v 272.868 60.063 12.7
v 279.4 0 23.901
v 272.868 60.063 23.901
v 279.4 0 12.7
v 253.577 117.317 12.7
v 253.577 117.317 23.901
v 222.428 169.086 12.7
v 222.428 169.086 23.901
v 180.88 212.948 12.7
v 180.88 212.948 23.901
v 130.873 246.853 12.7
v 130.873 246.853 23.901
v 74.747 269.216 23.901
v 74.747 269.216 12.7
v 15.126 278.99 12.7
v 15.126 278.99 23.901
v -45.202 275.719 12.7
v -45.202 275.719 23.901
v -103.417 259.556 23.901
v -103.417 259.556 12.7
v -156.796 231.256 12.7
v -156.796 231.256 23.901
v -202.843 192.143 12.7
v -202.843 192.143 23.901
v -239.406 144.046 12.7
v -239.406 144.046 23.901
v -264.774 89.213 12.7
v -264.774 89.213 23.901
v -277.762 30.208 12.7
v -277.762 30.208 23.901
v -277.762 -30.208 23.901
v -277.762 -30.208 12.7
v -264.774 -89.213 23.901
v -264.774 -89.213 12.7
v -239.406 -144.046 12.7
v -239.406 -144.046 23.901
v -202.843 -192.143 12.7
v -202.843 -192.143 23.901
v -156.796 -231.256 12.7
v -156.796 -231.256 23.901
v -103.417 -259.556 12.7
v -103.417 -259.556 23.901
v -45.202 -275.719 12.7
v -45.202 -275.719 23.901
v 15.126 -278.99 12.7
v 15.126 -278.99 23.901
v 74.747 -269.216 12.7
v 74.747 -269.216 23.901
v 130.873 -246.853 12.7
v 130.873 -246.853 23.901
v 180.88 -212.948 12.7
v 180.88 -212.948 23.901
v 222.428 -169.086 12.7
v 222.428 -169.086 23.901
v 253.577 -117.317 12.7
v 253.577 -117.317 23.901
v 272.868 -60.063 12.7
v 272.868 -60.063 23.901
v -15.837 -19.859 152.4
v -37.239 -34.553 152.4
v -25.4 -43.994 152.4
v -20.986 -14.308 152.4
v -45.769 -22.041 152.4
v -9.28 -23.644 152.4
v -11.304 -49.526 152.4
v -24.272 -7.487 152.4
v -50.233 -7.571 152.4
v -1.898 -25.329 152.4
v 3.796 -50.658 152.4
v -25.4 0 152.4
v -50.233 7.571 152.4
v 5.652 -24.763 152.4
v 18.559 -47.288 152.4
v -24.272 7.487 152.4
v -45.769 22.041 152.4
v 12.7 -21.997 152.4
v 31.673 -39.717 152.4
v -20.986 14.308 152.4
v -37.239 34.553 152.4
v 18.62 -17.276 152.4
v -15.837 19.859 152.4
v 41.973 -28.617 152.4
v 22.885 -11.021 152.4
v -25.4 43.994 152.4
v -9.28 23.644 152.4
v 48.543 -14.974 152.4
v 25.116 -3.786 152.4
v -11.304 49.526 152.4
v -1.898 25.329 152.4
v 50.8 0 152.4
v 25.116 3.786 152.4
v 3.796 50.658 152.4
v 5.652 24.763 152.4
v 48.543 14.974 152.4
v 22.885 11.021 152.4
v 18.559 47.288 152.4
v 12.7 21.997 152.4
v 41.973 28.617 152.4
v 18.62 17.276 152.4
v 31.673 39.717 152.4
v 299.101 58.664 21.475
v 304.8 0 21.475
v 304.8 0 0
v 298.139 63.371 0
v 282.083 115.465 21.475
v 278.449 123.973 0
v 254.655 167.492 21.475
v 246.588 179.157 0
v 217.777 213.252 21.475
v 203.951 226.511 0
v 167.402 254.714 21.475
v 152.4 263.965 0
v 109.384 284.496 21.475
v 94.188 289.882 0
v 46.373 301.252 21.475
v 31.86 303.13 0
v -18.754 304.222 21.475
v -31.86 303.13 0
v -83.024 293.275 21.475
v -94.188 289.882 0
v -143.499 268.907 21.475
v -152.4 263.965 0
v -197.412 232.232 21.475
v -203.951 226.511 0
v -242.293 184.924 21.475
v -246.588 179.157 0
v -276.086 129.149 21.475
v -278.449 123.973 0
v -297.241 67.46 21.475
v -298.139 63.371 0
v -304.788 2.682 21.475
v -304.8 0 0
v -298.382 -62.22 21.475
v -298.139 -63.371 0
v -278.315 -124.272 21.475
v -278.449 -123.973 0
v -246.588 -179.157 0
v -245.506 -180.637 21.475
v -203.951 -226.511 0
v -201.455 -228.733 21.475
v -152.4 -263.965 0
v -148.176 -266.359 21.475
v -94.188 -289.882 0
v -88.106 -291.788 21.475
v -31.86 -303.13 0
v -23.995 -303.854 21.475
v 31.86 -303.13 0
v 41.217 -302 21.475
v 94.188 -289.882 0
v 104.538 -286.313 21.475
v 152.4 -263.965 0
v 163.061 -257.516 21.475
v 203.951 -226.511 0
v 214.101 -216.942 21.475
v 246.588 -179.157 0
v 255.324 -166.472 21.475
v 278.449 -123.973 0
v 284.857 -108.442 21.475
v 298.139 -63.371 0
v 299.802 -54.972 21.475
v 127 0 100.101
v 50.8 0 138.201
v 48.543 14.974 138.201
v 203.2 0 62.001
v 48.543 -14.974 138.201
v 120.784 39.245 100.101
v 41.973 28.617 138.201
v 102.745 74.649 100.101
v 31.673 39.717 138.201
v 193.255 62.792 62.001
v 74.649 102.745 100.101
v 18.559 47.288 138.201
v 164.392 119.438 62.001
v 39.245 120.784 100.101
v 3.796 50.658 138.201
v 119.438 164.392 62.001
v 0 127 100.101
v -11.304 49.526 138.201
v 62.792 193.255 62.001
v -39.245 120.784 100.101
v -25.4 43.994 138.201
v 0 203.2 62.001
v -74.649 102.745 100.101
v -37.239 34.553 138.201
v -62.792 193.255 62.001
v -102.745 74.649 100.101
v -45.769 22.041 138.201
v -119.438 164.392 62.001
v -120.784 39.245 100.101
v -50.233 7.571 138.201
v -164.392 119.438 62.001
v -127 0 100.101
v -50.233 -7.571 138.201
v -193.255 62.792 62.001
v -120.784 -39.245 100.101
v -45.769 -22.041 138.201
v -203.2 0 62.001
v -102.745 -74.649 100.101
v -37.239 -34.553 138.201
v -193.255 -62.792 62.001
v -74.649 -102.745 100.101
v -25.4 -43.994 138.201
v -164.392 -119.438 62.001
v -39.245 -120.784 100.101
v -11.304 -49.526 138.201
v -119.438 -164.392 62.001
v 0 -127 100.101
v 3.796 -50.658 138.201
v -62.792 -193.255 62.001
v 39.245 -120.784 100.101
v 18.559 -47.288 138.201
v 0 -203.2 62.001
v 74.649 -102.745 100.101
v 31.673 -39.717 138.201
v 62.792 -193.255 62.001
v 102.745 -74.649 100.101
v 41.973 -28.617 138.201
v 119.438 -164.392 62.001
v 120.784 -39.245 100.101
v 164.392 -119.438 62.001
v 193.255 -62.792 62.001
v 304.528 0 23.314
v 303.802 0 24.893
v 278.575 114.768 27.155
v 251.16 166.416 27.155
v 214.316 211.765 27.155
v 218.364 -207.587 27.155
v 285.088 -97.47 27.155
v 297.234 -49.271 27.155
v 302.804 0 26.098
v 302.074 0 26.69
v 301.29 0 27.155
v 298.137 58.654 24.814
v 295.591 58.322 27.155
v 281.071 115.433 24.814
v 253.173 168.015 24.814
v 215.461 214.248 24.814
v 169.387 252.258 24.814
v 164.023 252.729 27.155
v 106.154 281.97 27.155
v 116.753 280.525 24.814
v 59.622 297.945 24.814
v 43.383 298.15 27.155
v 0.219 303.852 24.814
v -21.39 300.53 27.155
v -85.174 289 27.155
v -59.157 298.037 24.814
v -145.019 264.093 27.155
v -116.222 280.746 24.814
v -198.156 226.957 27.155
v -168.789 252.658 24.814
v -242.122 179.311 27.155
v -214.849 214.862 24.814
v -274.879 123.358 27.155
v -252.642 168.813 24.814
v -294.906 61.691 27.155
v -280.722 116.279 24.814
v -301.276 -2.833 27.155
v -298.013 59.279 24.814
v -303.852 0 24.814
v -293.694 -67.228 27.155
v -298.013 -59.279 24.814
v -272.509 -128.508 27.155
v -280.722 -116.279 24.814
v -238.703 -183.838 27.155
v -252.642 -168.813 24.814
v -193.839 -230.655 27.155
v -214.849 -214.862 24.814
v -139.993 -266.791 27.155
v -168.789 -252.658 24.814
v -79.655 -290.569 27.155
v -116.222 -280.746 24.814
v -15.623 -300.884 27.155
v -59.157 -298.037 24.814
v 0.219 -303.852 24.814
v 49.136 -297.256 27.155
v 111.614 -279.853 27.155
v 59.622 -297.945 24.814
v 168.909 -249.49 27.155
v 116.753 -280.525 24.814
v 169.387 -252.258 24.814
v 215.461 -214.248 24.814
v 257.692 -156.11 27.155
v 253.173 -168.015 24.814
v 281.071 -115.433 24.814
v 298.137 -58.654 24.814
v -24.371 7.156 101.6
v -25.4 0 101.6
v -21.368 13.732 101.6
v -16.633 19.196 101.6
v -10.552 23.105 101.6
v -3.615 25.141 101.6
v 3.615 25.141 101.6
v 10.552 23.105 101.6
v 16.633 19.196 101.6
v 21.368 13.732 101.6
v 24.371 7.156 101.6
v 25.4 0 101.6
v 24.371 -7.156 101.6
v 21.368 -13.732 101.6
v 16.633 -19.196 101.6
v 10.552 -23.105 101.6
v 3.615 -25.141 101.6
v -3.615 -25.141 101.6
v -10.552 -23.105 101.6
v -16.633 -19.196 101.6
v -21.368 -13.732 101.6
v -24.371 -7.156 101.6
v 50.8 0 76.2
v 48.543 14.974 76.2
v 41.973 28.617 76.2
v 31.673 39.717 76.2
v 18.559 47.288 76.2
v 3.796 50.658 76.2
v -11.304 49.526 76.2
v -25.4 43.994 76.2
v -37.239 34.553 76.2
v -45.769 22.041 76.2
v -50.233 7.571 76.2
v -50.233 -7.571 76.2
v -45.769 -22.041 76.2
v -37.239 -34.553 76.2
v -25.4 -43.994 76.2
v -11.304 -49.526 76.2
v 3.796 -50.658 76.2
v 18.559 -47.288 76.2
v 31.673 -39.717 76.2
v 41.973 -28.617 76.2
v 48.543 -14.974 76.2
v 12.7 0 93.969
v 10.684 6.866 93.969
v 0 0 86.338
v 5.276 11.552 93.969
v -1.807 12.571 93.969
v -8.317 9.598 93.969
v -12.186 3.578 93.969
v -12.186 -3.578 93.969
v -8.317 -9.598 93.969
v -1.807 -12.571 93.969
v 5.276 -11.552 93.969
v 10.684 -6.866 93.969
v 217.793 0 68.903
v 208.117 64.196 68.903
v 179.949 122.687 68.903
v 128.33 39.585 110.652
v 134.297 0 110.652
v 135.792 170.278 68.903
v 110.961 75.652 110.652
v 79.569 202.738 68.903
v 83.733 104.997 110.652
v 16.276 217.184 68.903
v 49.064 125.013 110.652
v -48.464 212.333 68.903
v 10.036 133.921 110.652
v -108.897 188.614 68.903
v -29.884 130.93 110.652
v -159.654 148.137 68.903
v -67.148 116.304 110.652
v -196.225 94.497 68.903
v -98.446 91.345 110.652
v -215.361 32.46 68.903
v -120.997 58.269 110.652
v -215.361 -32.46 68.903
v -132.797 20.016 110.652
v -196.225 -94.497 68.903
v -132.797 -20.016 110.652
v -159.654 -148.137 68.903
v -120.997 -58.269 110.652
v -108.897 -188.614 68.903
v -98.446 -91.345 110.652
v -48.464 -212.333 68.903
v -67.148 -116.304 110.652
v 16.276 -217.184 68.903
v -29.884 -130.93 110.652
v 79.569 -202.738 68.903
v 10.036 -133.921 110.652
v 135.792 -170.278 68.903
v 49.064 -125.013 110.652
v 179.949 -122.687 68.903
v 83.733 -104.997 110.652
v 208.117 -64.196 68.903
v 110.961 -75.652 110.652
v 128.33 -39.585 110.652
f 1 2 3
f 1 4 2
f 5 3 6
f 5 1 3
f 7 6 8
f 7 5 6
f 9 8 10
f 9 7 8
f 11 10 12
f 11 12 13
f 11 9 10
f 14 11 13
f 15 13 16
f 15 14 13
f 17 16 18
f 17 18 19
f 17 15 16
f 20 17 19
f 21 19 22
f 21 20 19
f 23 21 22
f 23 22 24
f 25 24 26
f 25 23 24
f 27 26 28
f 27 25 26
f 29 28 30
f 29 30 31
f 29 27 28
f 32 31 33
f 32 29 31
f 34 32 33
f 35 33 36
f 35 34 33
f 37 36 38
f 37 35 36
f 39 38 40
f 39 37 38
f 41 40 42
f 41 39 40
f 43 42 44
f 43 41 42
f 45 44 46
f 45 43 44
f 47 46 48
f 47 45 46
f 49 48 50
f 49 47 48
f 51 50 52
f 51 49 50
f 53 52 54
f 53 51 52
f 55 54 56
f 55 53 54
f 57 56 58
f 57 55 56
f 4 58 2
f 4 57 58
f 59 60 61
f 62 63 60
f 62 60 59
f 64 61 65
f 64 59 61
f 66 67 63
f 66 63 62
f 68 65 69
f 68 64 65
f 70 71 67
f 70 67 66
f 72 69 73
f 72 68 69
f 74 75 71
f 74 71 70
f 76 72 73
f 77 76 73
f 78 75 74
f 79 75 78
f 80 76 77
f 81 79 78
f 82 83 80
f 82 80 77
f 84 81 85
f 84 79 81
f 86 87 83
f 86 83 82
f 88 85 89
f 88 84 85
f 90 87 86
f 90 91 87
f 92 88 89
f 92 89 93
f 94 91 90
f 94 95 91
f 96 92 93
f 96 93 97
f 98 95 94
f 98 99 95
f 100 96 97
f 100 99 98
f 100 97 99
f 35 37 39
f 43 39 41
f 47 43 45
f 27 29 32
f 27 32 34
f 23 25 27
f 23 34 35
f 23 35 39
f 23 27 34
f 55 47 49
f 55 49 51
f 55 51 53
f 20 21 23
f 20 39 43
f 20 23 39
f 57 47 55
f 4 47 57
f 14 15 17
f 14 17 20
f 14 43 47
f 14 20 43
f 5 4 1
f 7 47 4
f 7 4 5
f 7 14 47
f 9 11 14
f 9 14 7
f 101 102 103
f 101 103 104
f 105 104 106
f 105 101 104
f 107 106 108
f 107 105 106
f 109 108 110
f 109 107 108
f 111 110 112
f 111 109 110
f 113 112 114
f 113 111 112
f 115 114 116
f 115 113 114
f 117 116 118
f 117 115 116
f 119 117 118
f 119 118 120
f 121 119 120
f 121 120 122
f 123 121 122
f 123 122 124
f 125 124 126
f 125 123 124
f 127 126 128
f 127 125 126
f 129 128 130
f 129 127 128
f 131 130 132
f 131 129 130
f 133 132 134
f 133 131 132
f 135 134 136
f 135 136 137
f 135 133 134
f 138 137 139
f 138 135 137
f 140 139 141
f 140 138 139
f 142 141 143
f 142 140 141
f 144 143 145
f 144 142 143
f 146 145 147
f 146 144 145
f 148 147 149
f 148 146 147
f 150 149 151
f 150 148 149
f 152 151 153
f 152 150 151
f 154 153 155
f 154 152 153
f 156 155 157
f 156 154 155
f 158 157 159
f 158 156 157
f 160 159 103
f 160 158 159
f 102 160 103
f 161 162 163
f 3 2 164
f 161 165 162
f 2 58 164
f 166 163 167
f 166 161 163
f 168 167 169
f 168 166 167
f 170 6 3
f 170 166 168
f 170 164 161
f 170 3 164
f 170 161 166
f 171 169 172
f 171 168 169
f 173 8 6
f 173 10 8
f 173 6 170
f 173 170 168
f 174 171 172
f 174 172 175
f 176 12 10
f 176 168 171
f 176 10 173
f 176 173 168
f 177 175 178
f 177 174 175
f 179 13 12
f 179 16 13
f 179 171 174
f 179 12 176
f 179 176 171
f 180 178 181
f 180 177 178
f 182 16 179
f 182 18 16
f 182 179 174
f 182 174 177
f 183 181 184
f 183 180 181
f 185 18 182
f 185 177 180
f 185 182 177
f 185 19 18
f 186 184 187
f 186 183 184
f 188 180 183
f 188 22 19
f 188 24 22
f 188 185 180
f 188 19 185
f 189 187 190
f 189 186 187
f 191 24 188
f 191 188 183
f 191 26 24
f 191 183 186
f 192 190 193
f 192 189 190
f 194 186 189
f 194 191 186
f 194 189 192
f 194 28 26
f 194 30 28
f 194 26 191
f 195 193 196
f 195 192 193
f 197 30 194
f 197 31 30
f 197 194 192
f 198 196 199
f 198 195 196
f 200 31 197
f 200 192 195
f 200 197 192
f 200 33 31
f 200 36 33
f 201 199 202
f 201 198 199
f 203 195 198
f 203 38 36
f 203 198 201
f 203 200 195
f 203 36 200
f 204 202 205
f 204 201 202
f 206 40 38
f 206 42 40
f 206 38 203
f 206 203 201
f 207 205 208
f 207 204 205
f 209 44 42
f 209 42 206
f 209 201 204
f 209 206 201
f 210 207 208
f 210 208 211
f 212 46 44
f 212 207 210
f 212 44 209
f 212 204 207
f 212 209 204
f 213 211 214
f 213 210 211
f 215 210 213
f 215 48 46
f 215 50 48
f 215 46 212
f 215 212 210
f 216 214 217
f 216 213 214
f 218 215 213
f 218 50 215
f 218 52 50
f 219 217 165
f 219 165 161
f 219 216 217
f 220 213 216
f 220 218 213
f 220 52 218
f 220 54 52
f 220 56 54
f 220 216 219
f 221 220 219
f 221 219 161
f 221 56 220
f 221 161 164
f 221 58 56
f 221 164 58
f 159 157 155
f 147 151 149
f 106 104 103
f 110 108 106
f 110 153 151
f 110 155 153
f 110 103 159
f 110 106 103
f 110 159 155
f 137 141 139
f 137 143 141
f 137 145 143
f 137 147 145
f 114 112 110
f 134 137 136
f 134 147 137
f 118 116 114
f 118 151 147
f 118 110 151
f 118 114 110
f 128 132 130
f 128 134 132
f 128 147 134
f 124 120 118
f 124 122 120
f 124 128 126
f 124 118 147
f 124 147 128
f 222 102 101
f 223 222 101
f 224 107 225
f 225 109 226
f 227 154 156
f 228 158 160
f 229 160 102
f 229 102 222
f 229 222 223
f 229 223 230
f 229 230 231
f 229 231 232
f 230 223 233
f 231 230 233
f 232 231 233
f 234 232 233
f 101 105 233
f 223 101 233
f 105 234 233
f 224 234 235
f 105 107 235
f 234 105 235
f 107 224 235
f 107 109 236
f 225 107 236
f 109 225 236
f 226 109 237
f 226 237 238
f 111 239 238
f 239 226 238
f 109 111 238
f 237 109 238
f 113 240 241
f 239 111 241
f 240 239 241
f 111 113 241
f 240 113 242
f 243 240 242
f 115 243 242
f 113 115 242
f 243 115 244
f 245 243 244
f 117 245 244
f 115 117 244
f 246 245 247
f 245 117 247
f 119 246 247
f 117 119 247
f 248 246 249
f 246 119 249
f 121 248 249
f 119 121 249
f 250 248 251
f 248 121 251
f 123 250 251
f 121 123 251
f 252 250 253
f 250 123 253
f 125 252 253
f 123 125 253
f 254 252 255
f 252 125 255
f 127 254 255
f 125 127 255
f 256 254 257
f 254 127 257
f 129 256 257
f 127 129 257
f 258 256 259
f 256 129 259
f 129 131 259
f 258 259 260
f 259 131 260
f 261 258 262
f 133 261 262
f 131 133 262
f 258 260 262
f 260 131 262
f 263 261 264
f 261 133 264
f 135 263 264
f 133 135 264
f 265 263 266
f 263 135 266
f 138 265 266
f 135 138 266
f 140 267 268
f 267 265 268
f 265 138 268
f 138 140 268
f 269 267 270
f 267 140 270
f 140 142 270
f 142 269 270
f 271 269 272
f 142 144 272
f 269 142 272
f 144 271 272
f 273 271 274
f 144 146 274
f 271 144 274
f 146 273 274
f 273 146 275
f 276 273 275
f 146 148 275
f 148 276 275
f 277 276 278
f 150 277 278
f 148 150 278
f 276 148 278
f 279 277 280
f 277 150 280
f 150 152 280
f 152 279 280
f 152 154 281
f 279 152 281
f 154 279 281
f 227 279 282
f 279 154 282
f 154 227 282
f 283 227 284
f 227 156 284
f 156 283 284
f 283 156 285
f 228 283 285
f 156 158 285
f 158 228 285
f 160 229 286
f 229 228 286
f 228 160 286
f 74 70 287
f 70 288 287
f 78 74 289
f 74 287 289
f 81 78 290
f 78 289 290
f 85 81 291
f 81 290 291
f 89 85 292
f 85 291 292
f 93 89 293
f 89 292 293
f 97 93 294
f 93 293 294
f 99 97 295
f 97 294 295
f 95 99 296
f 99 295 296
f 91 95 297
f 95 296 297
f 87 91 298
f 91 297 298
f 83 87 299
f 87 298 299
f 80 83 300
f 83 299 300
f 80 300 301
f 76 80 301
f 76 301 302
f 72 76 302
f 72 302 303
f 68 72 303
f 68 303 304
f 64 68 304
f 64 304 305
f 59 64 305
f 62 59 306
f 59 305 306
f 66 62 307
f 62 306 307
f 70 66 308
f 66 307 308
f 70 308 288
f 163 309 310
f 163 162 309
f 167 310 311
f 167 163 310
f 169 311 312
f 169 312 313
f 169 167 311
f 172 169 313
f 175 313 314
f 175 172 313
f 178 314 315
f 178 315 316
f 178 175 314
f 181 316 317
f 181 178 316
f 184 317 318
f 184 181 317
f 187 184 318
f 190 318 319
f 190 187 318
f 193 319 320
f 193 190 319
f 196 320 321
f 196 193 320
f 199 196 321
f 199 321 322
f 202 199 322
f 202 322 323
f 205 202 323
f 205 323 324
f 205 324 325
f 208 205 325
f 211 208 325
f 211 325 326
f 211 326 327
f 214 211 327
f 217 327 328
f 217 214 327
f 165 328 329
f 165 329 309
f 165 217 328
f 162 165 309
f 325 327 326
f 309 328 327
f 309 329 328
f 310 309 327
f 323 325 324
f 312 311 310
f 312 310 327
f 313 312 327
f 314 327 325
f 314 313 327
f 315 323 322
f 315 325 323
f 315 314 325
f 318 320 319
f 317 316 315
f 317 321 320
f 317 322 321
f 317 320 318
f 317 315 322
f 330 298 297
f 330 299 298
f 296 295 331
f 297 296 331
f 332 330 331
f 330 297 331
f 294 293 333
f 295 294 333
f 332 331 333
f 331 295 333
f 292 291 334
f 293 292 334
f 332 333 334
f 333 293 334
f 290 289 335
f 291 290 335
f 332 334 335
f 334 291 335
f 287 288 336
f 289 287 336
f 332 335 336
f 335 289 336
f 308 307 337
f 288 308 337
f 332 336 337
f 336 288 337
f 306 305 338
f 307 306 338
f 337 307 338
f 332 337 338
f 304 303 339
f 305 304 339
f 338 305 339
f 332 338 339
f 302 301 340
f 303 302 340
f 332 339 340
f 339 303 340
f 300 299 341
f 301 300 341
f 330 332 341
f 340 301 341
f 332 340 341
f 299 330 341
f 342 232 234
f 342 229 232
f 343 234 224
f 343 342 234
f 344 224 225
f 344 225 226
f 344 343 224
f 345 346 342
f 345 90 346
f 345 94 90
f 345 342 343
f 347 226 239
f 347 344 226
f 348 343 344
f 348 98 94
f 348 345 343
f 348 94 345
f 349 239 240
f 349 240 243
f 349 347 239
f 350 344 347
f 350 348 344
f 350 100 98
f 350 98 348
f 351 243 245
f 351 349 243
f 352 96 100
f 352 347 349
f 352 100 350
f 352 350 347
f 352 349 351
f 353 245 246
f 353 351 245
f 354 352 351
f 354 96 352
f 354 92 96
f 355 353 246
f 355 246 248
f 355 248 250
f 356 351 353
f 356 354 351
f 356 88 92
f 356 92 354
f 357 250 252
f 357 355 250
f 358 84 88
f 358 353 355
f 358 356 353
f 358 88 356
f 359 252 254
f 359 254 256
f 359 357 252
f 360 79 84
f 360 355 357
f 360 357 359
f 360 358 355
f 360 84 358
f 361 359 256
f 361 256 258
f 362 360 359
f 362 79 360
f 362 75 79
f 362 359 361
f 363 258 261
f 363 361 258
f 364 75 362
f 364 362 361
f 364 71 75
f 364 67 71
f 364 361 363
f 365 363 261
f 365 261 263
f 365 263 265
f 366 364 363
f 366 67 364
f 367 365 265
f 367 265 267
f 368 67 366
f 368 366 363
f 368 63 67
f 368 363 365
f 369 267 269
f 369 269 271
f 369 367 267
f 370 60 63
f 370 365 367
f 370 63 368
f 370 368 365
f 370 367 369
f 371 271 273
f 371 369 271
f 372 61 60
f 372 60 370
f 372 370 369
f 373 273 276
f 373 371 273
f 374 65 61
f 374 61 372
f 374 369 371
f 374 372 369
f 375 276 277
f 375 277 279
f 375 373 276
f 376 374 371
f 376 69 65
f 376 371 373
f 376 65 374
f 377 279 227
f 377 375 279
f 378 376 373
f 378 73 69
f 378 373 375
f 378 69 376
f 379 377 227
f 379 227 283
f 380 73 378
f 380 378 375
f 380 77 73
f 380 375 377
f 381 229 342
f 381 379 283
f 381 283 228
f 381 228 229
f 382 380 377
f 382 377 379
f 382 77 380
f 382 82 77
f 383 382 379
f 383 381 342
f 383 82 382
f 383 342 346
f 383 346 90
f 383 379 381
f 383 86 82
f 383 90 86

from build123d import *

# Parameters (mm, degrees)
F2_R     = 6.35
F4_D     = 50.8
F4_DEPTH = 50.8
F4_TIP   = 15.2618597233


with BuildPart() as f1:
    # F0 (on Front) → F1 (revolve)
    with BuildSketch(Plane.XZ):
        Polygon((0, 12.7), (0, 0), (304.8, 0), (304.8, 25.4), (50.8, 152.4), (0, 152.4), (0, 76.2), (50.8, 76.2), (50.8, 138.2009683429), (279.4, 23.9009683429), (279.4, 12.7), align=None)
    revolve(axis=Axis((0, 0, 114.3), (0, 0, 1)))

    # F2
    f2_edges = [f1.edges().sort_by_distance(p)[0] for p in [
        (-304.8, 0, 25.4),
    ]]
    fillet(f2_edges, radius=F2_R)

    # F4
    with Locations(Plane.XY.offset(152.4)):
        with Locations((0, 0)):
            Hole(F4_D / 2, depth=F4_DEPTH)
            with Locations((0, 0, -(F4_DEPTH + F4_TIP / 2))):  # 118° drill point
                Cone(0, F4_D / 2, F4_TIP, mode=Mode.SUBTRACT)


solid = f1.part
